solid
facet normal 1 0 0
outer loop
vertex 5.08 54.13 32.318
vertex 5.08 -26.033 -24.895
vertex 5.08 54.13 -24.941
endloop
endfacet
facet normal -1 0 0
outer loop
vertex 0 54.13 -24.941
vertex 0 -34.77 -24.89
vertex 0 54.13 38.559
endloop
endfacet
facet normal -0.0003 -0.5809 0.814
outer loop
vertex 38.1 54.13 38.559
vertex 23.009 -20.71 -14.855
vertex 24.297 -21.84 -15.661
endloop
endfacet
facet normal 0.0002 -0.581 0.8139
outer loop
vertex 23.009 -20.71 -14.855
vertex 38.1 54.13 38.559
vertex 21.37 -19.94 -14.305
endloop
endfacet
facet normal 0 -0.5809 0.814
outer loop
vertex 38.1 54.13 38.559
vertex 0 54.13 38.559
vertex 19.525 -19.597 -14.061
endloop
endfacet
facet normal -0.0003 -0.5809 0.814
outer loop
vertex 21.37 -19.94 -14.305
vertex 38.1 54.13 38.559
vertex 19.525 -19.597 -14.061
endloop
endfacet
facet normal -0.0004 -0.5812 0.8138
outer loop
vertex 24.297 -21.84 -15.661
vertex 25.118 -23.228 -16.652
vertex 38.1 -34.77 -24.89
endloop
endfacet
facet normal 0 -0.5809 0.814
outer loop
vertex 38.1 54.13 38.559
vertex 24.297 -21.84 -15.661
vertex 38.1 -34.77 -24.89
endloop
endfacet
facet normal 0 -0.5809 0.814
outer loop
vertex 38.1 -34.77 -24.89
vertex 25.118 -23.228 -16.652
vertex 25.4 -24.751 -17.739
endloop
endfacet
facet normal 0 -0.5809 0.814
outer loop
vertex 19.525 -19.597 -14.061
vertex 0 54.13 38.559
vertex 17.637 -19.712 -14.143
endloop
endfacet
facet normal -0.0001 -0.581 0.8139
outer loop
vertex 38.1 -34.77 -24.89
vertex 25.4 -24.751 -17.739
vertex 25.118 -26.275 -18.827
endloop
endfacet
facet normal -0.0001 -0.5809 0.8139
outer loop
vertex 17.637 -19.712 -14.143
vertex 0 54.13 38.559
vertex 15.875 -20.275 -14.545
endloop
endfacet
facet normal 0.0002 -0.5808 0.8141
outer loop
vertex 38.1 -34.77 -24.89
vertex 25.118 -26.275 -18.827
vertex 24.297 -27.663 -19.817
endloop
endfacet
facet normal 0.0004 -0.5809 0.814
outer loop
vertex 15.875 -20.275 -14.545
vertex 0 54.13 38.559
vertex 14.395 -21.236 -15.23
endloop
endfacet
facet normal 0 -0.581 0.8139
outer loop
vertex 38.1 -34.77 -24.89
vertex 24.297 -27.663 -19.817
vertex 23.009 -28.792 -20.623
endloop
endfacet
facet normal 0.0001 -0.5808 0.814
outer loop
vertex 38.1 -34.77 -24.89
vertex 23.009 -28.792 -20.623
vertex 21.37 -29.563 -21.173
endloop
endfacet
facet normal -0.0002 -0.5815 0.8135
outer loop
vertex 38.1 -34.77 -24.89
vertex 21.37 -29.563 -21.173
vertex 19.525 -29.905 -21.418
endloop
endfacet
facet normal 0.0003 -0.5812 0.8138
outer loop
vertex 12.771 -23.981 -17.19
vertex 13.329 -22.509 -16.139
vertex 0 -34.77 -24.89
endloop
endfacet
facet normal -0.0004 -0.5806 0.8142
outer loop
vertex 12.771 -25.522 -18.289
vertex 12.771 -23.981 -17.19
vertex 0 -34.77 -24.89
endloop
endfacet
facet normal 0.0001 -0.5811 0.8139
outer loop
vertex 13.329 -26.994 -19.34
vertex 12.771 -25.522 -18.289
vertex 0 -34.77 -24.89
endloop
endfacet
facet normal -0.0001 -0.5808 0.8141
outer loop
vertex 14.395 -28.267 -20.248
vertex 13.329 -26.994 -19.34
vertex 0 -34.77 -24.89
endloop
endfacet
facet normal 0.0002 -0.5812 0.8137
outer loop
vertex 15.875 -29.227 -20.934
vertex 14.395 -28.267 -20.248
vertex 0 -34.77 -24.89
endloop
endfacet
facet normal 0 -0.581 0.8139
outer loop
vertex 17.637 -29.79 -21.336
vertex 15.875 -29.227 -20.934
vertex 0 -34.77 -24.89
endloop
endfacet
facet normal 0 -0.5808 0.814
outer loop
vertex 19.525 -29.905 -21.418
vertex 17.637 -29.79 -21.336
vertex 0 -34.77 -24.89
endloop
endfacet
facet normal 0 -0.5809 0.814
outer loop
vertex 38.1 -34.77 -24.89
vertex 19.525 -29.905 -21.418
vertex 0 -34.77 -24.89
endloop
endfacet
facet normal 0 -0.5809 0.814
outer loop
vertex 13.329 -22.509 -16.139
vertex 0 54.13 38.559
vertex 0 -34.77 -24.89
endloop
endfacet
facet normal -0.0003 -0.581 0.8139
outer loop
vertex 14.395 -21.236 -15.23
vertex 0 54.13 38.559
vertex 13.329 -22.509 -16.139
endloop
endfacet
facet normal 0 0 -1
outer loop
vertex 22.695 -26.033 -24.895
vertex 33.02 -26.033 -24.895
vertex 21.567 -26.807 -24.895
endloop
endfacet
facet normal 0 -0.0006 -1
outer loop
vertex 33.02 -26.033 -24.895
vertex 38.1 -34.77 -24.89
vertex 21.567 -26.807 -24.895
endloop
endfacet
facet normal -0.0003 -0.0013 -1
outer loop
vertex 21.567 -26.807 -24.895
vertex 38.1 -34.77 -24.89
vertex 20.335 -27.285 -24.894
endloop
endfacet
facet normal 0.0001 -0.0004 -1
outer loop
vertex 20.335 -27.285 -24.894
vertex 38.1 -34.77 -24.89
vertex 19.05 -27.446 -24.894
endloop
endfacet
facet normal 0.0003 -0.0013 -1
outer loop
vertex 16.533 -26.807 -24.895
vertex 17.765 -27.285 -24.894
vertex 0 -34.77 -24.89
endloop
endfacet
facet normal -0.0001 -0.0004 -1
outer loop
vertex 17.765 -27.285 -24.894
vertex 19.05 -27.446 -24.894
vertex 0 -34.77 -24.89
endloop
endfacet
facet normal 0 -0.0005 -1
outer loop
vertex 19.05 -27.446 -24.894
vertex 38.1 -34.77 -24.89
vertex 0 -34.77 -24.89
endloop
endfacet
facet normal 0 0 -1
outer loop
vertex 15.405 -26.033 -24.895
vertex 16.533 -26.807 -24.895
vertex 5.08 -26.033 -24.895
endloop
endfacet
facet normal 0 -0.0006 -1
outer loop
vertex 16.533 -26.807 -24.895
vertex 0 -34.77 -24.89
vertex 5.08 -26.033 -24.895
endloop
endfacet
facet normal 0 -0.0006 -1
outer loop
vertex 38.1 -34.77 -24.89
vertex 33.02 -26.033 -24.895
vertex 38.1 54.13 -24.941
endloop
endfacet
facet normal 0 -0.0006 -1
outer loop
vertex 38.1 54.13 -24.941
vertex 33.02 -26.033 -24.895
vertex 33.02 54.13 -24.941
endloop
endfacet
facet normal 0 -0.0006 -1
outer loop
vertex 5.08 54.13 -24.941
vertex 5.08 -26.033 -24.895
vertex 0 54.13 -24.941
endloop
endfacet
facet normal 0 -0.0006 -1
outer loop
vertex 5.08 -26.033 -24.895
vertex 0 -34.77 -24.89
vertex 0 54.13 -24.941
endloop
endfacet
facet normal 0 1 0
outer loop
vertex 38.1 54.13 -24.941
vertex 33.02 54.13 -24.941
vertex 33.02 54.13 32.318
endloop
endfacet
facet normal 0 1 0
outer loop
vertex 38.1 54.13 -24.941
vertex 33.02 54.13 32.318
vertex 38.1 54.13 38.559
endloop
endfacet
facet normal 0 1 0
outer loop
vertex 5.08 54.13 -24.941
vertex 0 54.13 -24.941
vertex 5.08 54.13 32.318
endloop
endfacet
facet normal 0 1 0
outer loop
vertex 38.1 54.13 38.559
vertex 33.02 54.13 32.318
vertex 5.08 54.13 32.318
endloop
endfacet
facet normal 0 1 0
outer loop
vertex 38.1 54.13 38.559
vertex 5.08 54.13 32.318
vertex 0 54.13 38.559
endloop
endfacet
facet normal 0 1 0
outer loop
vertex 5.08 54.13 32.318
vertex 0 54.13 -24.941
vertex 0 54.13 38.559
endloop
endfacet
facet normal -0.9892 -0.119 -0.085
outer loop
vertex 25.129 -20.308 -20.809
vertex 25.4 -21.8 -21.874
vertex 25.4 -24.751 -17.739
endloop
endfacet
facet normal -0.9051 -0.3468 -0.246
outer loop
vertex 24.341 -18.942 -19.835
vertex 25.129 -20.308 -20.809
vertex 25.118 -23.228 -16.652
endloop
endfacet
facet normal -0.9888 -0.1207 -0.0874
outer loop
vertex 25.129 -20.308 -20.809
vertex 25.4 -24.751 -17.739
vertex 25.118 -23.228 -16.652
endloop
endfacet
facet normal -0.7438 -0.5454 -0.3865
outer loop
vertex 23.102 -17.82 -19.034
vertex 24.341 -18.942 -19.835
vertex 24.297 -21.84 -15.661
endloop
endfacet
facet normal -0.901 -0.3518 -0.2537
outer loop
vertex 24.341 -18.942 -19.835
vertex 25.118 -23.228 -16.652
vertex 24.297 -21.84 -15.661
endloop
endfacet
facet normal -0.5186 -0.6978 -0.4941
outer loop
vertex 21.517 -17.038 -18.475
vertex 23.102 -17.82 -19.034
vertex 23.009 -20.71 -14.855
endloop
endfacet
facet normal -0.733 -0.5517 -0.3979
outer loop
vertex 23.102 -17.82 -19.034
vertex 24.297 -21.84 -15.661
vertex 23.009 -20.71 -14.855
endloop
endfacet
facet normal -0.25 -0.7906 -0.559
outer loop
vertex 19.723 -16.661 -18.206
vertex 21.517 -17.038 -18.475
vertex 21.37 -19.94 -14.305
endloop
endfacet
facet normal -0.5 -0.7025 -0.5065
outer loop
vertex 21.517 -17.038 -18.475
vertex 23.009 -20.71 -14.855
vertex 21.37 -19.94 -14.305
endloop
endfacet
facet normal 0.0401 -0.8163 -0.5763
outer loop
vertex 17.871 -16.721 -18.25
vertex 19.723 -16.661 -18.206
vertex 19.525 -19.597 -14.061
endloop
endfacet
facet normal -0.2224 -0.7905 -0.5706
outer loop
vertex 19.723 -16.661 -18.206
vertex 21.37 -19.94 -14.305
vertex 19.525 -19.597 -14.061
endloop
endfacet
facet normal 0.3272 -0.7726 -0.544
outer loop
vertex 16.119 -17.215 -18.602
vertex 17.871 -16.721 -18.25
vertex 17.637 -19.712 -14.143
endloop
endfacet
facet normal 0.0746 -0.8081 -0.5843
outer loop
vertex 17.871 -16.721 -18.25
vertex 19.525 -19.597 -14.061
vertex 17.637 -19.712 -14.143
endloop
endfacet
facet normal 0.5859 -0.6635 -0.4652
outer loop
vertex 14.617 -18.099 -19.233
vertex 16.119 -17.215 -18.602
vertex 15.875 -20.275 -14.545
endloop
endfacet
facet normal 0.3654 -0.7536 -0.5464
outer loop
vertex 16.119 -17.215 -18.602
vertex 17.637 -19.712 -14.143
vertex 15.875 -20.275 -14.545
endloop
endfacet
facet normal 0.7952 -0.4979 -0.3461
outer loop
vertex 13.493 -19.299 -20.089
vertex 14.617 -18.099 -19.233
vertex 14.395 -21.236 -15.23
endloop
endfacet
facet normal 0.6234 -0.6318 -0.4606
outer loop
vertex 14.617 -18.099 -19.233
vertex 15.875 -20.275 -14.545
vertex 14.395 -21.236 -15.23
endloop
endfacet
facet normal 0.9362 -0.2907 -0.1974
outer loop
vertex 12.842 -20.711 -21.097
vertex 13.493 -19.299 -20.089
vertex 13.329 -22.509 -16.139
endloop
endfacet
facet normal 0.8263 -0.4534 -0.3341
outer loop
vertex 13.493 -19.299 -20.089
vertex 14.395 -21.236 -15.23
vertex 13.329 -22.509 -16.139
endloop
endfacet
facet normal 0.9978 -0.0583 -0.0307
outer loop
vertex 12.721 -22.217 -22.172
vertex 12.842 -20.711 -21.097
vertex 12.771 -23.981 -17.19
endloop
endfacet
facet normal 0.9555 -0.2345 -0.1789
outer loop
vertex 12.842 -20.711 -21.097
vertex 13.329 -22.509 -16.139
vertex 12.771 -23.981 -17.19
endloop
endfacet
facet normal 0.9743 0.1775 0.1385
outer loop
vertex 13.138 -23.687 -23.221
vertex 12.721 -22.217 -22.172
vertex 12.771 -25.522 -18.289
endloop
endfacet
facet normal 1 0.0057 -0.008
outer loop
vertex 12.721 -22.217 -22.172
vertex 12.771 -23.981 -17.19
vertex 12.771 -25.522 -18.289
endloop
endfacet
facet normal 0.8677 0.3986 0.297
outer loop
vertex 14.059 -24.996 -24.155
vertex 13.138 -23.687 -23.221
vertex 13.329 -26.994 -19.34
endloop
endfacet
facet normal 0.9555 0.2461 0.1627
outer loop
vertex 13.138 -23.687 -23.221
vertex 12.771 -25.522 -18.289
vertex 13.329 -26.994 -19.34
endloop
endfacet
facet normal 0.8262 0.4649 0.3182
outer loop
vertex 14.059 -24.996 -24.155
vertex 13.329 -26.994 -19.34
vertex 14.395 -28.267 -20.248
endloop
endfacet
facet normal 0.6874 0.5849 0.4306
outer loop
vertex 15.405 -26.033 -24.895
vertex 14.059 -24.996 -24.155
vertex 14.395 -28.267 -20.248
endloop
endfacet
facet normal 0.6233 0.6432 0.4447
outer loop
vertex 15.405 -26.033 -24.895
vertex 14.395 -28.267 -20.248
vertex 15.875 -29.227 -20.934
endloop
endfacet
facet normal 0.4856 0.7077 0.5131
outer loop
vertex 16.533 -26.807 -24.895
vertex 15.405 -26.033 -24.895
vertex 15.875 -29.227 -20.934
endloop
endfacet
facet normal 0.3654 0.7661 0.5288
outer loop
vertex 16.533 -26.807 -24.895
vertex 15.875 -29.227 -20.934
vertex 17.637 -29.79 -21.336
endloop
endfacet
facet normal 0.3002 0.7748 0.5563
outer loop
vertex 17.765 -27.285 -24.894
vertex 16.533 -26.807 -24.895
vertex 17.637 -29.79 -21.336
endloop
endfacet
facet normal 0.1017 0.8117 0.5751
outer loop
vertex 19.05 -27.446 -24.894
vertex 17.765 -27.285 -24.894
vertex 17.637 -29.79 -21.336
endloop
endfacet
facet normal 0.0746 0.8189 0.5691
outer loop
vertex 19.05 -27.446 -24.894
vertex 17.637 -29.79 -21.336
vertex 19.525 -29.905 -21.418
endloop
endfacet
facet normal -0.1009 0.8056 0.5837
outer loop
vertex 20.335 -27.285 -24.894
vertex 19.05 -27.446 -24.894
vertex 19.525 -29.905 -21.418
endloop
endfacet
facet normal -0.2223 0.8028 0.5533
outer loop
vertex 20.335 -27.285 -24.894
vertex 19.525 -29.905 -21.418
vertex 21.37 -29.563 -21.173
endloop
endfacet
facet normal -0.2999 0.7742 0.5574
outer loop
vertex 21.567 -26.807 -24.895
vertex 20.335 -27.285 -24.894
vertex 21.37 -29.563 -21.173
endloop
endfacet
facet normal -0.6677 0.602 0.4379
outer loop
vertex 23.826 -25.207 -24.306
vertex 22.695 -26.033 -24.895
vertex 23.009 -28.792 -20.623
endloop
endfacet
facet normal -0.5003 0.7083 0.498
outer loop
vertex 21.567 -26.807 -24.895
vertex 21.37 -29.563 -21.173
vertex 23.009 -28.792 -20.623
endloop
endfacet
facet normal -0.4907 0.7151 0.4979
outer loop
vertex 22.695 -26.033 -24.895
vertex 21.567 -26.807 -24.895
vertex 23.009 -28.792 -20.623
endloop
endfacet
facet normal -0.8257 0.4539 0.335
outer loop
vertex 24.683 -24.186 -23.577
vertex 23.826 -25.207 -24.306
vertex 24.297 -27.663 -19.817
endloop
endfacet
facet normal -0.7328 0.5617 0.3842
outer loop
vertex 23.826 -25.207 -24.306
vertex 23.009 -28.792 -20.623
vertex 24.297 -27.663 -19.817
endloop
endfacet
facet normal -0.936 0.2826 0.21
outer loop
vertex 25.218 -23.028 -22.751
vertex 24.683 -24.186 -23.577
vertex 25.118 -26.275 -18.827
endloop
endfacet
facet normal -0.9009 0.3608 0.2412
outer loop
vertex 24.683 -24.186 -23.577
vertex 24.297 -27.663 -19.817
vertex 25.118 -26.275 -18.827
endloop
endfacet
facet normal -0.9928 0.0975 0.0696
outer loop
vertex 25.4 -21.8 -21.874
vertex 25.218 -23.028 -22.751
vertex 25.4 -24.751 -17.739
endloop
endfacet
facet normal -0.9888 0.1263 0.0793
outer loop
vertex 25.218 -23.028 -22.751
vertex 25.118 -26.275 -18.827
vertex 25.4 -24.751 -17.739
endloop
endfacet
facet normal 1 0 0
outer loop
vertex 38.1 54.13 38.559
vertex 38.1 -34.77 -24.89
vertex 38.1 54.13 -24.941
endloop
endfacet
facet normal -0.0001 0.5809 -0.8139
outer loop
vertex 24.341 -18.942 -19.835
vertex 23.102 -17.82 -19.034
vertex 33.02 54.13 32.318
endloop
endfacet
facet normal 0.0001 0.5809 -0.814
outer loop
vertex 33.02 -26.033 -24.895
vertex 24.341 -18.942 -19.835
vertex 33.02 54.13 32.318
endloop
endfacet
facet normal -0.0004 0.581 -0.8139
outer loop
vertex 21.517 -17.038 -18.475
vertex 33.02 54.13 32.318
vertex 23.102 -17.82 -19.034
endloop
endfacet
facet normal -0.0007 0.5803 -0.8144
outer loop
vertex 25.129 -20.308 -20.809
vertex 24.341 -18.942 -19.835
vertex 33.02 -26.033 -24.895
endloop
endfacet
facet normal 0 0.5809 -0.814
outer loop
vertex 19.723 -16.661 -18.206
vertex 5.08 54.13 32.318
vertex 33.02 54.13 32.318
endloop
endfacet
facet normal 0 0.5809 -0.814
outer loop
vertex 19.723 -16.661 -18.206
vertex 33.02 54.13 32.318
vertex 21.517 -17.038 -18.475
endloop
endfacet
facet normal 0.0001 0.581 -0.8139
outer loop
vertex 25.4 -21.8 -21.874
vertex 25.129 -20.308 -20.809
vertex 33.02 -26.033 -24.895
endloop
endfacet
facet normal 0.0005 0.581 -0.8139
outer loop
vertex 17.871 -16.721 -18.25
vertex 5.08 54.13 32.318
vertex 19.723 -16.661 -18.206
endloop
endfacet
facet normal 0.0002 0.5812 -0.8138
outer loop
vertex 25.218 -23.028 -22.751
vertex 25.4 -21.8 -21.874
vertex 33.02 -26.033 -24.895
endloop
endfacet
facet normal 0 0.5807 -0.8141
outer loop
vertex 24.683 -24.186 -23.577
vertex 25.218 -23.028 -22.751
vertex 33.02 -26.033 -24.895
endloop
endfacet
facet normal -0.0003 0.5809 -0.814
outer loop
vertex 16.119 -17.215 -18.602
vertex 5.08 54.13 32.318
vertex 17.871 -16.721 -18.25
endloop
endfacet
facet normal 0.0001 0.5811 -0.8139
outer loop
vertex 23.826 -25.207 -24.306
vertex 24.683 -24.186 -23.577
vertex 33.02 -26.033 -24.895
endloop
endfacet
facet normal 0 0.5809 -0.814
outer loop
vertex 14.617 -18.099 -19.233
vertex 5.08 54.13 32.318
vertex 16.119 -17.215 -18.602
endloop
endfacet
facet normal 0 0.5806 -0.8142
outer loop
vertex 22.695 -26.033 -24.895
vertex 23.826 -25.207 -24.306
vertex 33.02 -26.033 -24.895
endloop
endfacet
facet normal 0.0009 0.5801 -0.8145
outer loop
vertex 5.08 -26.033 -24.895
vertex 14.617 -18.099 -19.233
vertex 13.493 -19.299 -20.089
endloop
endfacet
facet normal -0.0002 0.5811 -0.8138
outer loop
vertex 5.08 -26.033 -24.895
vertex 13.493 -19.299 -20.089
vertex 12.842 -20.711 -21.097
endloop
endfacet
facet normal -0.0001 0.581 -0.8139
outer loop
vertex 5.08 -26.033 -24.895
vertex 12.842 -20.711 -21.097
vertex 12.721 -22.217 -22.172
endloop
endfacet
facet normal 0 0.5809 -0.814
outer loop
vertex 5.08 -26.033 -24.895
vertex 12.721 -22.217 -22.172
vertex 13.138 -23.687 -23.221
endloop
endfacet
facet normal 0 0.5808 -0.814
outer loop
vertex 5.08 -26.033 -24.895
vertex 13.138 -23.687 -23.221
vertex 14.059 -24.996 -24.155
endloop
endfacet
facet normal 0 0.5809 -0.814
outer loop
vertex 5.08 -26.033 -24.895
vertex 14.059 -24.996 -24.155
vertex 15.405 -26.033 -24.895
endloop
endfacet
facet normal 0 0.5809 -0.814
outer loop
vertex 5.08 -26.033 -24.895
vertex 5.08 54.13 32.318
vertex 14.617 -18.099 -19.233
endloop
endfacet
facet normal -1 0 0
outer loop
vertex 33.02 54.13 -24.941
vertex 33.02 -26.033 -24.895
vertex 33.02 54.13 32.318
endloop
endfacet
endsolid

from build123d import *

# Parameters (mm, degrees)
F1_DEPTH       = 38.1
F2_T           = -5.08
F4_D           = 6.35
F4_CBORE_D     = 12.7
F4_CBORE_DEPTH = 5.08


with BuildPart() as f1:
    # F0 (on Right) → F1 (new body)
    with BuildSketch(Plane.YZ):
        Polygon((54.129655, 38.559098), (-34.77033, -24.890102), (54.129655, -24.940902), align=None)
    extrude(amount=F1_DEPTH)

    # F2
    f2_openings = [f1.faces().sort_by_distance(p)[0] for p in [
        (19.05, 9.679663, -24.915502),
        (19.05, 54.129655, 6.809098),
    ]]
    offset(amount=F2_T, openings=f2_openings)

    # F4 (through all)
    with Locations(Plane(origin=(0, 0.034999, -0.049037), x_dir=(1, 0, 0), z_dir=(0, -0.58093, 0.813953))):
        with Locations((19.05, -30.451737)):
            CounterBoreHole(F4_D / 2, F4_CBORE_D / 2, F4_CBORE_DEPTH)


solid = f1.part
